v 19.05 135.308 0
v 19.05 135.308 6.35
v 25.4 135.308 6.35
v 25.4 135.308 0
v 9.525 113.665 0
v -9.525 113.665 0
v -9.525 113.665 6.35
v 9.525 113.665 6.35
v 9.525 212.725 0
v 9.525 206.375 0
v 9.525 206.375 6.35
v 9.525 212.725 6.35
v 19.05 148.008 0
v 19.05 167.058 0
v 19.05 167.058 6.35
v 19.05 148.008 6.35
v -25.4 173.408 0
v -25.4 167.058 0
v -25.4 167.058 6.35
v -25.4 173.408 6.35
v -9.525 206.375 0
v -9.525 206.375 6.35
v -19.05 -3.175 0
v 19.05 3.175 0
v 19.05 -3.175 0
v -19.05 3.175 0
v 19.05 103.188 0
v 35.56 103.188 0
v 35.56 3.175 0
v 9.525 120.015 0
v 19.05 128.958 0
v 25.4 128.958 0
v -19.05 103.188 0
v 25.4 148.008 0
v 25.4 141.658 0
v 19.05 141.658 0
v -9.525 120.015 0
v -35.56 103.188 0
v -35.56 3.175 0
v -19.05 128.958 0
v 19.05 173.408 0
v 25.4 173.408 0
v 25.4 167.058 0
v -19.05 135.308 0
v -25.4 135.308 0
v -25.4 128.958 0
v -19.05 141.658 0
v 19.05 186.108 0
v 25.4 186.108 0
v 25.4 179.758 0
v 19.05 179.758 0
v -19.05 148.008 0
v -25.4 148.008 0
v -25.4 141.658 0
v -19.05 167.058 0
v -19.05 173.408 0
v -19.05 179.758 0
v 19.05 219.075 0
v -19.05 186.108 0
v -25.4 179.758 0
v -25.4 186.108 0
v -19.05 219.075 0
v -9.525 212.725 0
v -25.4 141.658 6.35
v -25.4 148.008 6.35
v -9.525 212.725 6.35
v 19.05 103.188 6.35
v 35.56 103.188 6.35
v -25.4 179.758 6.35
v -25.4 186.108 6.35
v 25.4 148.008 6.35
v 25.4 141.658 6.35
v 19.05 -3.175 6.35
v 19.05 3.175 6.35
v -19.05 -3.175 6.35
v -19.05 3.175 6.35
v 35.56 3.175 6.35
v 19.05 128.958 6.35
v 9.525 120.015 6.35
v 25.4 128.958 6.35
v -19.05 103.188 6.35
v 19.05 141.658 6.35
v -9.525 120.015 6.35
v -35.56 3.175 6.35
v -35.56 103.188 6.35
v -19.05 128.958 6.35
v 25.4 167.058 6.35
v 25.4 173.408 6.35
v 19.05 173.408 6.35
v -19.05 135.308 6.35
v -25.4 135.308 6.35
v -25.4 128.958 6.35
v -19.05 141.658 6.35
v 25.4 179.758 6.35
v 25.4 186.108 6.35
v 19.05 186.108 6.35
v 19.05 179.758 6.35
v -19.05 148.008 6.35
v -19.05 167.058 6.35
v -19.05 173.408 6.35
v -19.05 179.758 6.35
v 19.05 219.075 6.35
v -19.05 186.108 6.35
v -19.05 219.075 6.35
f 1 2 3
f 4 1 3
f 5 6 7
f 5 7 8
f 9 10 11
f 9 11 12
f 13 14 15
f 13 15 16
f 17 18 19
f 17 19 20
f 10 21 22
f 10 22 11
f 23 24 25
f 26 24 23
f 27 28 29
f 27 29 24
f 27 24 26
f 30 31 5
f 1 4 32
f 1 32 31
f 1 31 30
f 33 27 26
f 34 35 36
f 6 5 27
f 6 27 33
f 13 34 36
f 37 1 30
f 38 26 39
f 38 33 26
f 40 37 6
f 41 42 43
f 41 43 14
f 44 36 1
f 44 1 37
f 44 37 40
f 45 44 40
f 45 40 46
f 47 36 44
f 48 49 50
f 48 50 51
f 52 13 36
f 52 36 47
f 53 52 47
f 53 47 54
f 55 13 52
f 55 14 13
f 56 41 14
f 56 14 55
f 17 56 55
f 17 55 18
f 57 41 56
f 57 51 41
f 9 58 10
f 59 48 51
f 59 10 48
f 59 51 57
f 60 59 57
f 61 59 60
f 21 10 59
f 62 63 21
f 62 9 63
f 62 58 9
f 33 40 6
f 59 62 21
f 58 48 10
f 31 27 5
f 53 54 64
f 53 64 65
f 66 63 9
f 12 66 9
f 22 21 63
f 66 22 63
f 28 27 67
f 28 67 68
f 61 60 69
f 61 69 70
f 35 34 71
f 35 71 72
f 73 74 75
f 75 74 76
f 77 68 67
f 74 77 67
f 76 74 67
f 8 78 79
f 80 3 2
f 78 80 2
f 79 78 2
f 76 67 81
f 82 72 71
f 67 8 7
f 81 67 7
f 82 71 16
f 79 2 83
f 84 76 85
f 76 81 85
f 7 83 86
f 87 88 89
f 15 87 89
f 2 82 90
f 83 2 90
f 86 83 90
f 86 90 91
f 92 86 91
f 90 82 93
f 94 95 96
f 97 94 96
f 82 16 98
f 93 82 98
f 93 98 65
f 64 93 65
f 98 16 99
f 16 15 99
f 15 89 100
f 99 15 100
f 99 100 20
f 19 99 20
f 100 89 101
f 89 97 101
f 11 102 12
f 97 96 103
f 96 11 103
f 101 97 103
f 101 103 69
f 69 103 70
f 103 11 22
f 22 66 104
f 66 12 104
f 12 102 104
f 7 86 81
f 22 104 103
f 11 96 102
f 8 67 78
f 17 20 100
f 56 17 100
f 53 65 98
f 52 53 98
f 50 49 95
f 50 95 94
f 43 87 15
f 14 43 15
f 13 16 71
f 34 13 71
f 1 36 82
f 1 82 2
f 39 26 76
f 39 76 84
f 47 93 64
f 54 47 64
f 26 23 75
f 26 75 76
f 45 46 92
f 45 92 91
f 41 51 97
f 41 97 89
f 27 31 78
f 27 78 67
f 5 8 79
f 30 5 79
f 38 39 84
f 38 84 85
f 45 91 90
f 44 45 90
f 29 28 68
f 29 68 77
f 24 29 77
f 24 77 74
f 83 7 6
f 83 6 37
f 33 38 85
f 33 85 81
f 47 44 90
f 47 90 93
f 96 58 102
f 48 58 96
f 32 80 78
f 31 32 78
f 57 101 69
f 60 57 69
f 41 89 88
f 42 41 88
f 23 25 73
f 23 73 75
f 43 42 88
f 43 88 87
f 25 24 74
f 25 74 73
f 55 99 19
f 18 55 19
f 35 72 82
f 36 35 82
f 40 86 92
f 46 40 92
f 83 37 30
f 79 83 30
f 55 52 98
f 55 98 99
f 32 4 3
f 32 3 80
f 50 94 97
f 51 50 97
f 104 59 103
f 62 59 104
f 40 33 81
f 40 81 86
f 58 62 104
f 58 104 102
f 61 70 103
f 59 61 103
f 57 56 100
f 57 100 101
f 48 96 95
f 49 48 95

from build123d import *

# Parameters (mm, degrees)
SKETCH1_W           = 19.05
SKETCH1_H           = 6.35
BOSS_EXTRUDE1_DEPTH = 6.35
CUT_EXTRUDE1_DEPTH  = 6.35


with BuildPart() as part:
    # Sketch1 → Boss-Extrude1 (new body)
    with BuildSketch(Plane.XY):
        Polygon((19.05, -3.175), (-19.05, -3.175), (-19.05, 3.175), (-35.56, 3.175), (-35.56, 219.075), (35.56, 219.075), (35.56, 3.175), (19.05, 3.175), align=None)
        with Locations((0, 209.55)):
            Rectangle(SKETCH1_W, SKETCH1_H, mode=Mode.SUBTRACT)
        with Locations((0, 116.84)):
            Rectangle(SKETCH1_W, SKETCH1_H, mode=Mode.SUBTRACT)
    extrude(amount=BOSS_EXTRUDE1_DEPTH)

    # Sketch3 → Cut-Extrude1 (cut)
    with BuildSketch(Plane(origin=(0, 0, 0), x_dir=(-1, 0, 0), z_dir=(0, 0, -1))):
        Polygon((-35.56, 219.075), (-19.05, 219.075), (-19.05, 186.108405272), (-25.4, 186.108405272), (-25.4, 179.758405272), (-19.05, 179.758405272), (-19.05, 173.408405272), (-25.4, 173.408405272), (-25.4, 167.058405272), (-19.05, 167.058405272), (-19.05, 148.008405272), (-25.4, 148.008405272), (-25.4, 141.658405272), (-19.05, 141.658405272), (-19.05, 135.308405272), (-25.4, 135.308405272), (-25.4, 128.958405272), (-19.05, 128.958405272), (-19.05, 103.1875), (-35.56, 103.1875), align=None)
        Polygon((35.56, 103.1875), (19.05, 103.1875), (19.05, 128.958405272), (25.4, 128.958405272), (25.4, 135.308405272), (19.05, 135.308405272), (19.05, 141.658405272), (25.4, 141.658405272), (25.4, 148.008405272), (19.05, 148.008405272), (19.05, 167.058405272), (25.4, 167.058405272), (25.4, 173.408405272), (19.05, 173.408405272), (19.05, 179.758405272), (25.4, 179.758405272), (25.4, 186.108405272), (19.05, 186.108405272), (19.05, 219.075), (35.56, 219.075), align=None)
    extrude(amount=-CUT_EXTRUDE1_DEPTH, mode=Mode.SUBTRACT)


solid = part.part
